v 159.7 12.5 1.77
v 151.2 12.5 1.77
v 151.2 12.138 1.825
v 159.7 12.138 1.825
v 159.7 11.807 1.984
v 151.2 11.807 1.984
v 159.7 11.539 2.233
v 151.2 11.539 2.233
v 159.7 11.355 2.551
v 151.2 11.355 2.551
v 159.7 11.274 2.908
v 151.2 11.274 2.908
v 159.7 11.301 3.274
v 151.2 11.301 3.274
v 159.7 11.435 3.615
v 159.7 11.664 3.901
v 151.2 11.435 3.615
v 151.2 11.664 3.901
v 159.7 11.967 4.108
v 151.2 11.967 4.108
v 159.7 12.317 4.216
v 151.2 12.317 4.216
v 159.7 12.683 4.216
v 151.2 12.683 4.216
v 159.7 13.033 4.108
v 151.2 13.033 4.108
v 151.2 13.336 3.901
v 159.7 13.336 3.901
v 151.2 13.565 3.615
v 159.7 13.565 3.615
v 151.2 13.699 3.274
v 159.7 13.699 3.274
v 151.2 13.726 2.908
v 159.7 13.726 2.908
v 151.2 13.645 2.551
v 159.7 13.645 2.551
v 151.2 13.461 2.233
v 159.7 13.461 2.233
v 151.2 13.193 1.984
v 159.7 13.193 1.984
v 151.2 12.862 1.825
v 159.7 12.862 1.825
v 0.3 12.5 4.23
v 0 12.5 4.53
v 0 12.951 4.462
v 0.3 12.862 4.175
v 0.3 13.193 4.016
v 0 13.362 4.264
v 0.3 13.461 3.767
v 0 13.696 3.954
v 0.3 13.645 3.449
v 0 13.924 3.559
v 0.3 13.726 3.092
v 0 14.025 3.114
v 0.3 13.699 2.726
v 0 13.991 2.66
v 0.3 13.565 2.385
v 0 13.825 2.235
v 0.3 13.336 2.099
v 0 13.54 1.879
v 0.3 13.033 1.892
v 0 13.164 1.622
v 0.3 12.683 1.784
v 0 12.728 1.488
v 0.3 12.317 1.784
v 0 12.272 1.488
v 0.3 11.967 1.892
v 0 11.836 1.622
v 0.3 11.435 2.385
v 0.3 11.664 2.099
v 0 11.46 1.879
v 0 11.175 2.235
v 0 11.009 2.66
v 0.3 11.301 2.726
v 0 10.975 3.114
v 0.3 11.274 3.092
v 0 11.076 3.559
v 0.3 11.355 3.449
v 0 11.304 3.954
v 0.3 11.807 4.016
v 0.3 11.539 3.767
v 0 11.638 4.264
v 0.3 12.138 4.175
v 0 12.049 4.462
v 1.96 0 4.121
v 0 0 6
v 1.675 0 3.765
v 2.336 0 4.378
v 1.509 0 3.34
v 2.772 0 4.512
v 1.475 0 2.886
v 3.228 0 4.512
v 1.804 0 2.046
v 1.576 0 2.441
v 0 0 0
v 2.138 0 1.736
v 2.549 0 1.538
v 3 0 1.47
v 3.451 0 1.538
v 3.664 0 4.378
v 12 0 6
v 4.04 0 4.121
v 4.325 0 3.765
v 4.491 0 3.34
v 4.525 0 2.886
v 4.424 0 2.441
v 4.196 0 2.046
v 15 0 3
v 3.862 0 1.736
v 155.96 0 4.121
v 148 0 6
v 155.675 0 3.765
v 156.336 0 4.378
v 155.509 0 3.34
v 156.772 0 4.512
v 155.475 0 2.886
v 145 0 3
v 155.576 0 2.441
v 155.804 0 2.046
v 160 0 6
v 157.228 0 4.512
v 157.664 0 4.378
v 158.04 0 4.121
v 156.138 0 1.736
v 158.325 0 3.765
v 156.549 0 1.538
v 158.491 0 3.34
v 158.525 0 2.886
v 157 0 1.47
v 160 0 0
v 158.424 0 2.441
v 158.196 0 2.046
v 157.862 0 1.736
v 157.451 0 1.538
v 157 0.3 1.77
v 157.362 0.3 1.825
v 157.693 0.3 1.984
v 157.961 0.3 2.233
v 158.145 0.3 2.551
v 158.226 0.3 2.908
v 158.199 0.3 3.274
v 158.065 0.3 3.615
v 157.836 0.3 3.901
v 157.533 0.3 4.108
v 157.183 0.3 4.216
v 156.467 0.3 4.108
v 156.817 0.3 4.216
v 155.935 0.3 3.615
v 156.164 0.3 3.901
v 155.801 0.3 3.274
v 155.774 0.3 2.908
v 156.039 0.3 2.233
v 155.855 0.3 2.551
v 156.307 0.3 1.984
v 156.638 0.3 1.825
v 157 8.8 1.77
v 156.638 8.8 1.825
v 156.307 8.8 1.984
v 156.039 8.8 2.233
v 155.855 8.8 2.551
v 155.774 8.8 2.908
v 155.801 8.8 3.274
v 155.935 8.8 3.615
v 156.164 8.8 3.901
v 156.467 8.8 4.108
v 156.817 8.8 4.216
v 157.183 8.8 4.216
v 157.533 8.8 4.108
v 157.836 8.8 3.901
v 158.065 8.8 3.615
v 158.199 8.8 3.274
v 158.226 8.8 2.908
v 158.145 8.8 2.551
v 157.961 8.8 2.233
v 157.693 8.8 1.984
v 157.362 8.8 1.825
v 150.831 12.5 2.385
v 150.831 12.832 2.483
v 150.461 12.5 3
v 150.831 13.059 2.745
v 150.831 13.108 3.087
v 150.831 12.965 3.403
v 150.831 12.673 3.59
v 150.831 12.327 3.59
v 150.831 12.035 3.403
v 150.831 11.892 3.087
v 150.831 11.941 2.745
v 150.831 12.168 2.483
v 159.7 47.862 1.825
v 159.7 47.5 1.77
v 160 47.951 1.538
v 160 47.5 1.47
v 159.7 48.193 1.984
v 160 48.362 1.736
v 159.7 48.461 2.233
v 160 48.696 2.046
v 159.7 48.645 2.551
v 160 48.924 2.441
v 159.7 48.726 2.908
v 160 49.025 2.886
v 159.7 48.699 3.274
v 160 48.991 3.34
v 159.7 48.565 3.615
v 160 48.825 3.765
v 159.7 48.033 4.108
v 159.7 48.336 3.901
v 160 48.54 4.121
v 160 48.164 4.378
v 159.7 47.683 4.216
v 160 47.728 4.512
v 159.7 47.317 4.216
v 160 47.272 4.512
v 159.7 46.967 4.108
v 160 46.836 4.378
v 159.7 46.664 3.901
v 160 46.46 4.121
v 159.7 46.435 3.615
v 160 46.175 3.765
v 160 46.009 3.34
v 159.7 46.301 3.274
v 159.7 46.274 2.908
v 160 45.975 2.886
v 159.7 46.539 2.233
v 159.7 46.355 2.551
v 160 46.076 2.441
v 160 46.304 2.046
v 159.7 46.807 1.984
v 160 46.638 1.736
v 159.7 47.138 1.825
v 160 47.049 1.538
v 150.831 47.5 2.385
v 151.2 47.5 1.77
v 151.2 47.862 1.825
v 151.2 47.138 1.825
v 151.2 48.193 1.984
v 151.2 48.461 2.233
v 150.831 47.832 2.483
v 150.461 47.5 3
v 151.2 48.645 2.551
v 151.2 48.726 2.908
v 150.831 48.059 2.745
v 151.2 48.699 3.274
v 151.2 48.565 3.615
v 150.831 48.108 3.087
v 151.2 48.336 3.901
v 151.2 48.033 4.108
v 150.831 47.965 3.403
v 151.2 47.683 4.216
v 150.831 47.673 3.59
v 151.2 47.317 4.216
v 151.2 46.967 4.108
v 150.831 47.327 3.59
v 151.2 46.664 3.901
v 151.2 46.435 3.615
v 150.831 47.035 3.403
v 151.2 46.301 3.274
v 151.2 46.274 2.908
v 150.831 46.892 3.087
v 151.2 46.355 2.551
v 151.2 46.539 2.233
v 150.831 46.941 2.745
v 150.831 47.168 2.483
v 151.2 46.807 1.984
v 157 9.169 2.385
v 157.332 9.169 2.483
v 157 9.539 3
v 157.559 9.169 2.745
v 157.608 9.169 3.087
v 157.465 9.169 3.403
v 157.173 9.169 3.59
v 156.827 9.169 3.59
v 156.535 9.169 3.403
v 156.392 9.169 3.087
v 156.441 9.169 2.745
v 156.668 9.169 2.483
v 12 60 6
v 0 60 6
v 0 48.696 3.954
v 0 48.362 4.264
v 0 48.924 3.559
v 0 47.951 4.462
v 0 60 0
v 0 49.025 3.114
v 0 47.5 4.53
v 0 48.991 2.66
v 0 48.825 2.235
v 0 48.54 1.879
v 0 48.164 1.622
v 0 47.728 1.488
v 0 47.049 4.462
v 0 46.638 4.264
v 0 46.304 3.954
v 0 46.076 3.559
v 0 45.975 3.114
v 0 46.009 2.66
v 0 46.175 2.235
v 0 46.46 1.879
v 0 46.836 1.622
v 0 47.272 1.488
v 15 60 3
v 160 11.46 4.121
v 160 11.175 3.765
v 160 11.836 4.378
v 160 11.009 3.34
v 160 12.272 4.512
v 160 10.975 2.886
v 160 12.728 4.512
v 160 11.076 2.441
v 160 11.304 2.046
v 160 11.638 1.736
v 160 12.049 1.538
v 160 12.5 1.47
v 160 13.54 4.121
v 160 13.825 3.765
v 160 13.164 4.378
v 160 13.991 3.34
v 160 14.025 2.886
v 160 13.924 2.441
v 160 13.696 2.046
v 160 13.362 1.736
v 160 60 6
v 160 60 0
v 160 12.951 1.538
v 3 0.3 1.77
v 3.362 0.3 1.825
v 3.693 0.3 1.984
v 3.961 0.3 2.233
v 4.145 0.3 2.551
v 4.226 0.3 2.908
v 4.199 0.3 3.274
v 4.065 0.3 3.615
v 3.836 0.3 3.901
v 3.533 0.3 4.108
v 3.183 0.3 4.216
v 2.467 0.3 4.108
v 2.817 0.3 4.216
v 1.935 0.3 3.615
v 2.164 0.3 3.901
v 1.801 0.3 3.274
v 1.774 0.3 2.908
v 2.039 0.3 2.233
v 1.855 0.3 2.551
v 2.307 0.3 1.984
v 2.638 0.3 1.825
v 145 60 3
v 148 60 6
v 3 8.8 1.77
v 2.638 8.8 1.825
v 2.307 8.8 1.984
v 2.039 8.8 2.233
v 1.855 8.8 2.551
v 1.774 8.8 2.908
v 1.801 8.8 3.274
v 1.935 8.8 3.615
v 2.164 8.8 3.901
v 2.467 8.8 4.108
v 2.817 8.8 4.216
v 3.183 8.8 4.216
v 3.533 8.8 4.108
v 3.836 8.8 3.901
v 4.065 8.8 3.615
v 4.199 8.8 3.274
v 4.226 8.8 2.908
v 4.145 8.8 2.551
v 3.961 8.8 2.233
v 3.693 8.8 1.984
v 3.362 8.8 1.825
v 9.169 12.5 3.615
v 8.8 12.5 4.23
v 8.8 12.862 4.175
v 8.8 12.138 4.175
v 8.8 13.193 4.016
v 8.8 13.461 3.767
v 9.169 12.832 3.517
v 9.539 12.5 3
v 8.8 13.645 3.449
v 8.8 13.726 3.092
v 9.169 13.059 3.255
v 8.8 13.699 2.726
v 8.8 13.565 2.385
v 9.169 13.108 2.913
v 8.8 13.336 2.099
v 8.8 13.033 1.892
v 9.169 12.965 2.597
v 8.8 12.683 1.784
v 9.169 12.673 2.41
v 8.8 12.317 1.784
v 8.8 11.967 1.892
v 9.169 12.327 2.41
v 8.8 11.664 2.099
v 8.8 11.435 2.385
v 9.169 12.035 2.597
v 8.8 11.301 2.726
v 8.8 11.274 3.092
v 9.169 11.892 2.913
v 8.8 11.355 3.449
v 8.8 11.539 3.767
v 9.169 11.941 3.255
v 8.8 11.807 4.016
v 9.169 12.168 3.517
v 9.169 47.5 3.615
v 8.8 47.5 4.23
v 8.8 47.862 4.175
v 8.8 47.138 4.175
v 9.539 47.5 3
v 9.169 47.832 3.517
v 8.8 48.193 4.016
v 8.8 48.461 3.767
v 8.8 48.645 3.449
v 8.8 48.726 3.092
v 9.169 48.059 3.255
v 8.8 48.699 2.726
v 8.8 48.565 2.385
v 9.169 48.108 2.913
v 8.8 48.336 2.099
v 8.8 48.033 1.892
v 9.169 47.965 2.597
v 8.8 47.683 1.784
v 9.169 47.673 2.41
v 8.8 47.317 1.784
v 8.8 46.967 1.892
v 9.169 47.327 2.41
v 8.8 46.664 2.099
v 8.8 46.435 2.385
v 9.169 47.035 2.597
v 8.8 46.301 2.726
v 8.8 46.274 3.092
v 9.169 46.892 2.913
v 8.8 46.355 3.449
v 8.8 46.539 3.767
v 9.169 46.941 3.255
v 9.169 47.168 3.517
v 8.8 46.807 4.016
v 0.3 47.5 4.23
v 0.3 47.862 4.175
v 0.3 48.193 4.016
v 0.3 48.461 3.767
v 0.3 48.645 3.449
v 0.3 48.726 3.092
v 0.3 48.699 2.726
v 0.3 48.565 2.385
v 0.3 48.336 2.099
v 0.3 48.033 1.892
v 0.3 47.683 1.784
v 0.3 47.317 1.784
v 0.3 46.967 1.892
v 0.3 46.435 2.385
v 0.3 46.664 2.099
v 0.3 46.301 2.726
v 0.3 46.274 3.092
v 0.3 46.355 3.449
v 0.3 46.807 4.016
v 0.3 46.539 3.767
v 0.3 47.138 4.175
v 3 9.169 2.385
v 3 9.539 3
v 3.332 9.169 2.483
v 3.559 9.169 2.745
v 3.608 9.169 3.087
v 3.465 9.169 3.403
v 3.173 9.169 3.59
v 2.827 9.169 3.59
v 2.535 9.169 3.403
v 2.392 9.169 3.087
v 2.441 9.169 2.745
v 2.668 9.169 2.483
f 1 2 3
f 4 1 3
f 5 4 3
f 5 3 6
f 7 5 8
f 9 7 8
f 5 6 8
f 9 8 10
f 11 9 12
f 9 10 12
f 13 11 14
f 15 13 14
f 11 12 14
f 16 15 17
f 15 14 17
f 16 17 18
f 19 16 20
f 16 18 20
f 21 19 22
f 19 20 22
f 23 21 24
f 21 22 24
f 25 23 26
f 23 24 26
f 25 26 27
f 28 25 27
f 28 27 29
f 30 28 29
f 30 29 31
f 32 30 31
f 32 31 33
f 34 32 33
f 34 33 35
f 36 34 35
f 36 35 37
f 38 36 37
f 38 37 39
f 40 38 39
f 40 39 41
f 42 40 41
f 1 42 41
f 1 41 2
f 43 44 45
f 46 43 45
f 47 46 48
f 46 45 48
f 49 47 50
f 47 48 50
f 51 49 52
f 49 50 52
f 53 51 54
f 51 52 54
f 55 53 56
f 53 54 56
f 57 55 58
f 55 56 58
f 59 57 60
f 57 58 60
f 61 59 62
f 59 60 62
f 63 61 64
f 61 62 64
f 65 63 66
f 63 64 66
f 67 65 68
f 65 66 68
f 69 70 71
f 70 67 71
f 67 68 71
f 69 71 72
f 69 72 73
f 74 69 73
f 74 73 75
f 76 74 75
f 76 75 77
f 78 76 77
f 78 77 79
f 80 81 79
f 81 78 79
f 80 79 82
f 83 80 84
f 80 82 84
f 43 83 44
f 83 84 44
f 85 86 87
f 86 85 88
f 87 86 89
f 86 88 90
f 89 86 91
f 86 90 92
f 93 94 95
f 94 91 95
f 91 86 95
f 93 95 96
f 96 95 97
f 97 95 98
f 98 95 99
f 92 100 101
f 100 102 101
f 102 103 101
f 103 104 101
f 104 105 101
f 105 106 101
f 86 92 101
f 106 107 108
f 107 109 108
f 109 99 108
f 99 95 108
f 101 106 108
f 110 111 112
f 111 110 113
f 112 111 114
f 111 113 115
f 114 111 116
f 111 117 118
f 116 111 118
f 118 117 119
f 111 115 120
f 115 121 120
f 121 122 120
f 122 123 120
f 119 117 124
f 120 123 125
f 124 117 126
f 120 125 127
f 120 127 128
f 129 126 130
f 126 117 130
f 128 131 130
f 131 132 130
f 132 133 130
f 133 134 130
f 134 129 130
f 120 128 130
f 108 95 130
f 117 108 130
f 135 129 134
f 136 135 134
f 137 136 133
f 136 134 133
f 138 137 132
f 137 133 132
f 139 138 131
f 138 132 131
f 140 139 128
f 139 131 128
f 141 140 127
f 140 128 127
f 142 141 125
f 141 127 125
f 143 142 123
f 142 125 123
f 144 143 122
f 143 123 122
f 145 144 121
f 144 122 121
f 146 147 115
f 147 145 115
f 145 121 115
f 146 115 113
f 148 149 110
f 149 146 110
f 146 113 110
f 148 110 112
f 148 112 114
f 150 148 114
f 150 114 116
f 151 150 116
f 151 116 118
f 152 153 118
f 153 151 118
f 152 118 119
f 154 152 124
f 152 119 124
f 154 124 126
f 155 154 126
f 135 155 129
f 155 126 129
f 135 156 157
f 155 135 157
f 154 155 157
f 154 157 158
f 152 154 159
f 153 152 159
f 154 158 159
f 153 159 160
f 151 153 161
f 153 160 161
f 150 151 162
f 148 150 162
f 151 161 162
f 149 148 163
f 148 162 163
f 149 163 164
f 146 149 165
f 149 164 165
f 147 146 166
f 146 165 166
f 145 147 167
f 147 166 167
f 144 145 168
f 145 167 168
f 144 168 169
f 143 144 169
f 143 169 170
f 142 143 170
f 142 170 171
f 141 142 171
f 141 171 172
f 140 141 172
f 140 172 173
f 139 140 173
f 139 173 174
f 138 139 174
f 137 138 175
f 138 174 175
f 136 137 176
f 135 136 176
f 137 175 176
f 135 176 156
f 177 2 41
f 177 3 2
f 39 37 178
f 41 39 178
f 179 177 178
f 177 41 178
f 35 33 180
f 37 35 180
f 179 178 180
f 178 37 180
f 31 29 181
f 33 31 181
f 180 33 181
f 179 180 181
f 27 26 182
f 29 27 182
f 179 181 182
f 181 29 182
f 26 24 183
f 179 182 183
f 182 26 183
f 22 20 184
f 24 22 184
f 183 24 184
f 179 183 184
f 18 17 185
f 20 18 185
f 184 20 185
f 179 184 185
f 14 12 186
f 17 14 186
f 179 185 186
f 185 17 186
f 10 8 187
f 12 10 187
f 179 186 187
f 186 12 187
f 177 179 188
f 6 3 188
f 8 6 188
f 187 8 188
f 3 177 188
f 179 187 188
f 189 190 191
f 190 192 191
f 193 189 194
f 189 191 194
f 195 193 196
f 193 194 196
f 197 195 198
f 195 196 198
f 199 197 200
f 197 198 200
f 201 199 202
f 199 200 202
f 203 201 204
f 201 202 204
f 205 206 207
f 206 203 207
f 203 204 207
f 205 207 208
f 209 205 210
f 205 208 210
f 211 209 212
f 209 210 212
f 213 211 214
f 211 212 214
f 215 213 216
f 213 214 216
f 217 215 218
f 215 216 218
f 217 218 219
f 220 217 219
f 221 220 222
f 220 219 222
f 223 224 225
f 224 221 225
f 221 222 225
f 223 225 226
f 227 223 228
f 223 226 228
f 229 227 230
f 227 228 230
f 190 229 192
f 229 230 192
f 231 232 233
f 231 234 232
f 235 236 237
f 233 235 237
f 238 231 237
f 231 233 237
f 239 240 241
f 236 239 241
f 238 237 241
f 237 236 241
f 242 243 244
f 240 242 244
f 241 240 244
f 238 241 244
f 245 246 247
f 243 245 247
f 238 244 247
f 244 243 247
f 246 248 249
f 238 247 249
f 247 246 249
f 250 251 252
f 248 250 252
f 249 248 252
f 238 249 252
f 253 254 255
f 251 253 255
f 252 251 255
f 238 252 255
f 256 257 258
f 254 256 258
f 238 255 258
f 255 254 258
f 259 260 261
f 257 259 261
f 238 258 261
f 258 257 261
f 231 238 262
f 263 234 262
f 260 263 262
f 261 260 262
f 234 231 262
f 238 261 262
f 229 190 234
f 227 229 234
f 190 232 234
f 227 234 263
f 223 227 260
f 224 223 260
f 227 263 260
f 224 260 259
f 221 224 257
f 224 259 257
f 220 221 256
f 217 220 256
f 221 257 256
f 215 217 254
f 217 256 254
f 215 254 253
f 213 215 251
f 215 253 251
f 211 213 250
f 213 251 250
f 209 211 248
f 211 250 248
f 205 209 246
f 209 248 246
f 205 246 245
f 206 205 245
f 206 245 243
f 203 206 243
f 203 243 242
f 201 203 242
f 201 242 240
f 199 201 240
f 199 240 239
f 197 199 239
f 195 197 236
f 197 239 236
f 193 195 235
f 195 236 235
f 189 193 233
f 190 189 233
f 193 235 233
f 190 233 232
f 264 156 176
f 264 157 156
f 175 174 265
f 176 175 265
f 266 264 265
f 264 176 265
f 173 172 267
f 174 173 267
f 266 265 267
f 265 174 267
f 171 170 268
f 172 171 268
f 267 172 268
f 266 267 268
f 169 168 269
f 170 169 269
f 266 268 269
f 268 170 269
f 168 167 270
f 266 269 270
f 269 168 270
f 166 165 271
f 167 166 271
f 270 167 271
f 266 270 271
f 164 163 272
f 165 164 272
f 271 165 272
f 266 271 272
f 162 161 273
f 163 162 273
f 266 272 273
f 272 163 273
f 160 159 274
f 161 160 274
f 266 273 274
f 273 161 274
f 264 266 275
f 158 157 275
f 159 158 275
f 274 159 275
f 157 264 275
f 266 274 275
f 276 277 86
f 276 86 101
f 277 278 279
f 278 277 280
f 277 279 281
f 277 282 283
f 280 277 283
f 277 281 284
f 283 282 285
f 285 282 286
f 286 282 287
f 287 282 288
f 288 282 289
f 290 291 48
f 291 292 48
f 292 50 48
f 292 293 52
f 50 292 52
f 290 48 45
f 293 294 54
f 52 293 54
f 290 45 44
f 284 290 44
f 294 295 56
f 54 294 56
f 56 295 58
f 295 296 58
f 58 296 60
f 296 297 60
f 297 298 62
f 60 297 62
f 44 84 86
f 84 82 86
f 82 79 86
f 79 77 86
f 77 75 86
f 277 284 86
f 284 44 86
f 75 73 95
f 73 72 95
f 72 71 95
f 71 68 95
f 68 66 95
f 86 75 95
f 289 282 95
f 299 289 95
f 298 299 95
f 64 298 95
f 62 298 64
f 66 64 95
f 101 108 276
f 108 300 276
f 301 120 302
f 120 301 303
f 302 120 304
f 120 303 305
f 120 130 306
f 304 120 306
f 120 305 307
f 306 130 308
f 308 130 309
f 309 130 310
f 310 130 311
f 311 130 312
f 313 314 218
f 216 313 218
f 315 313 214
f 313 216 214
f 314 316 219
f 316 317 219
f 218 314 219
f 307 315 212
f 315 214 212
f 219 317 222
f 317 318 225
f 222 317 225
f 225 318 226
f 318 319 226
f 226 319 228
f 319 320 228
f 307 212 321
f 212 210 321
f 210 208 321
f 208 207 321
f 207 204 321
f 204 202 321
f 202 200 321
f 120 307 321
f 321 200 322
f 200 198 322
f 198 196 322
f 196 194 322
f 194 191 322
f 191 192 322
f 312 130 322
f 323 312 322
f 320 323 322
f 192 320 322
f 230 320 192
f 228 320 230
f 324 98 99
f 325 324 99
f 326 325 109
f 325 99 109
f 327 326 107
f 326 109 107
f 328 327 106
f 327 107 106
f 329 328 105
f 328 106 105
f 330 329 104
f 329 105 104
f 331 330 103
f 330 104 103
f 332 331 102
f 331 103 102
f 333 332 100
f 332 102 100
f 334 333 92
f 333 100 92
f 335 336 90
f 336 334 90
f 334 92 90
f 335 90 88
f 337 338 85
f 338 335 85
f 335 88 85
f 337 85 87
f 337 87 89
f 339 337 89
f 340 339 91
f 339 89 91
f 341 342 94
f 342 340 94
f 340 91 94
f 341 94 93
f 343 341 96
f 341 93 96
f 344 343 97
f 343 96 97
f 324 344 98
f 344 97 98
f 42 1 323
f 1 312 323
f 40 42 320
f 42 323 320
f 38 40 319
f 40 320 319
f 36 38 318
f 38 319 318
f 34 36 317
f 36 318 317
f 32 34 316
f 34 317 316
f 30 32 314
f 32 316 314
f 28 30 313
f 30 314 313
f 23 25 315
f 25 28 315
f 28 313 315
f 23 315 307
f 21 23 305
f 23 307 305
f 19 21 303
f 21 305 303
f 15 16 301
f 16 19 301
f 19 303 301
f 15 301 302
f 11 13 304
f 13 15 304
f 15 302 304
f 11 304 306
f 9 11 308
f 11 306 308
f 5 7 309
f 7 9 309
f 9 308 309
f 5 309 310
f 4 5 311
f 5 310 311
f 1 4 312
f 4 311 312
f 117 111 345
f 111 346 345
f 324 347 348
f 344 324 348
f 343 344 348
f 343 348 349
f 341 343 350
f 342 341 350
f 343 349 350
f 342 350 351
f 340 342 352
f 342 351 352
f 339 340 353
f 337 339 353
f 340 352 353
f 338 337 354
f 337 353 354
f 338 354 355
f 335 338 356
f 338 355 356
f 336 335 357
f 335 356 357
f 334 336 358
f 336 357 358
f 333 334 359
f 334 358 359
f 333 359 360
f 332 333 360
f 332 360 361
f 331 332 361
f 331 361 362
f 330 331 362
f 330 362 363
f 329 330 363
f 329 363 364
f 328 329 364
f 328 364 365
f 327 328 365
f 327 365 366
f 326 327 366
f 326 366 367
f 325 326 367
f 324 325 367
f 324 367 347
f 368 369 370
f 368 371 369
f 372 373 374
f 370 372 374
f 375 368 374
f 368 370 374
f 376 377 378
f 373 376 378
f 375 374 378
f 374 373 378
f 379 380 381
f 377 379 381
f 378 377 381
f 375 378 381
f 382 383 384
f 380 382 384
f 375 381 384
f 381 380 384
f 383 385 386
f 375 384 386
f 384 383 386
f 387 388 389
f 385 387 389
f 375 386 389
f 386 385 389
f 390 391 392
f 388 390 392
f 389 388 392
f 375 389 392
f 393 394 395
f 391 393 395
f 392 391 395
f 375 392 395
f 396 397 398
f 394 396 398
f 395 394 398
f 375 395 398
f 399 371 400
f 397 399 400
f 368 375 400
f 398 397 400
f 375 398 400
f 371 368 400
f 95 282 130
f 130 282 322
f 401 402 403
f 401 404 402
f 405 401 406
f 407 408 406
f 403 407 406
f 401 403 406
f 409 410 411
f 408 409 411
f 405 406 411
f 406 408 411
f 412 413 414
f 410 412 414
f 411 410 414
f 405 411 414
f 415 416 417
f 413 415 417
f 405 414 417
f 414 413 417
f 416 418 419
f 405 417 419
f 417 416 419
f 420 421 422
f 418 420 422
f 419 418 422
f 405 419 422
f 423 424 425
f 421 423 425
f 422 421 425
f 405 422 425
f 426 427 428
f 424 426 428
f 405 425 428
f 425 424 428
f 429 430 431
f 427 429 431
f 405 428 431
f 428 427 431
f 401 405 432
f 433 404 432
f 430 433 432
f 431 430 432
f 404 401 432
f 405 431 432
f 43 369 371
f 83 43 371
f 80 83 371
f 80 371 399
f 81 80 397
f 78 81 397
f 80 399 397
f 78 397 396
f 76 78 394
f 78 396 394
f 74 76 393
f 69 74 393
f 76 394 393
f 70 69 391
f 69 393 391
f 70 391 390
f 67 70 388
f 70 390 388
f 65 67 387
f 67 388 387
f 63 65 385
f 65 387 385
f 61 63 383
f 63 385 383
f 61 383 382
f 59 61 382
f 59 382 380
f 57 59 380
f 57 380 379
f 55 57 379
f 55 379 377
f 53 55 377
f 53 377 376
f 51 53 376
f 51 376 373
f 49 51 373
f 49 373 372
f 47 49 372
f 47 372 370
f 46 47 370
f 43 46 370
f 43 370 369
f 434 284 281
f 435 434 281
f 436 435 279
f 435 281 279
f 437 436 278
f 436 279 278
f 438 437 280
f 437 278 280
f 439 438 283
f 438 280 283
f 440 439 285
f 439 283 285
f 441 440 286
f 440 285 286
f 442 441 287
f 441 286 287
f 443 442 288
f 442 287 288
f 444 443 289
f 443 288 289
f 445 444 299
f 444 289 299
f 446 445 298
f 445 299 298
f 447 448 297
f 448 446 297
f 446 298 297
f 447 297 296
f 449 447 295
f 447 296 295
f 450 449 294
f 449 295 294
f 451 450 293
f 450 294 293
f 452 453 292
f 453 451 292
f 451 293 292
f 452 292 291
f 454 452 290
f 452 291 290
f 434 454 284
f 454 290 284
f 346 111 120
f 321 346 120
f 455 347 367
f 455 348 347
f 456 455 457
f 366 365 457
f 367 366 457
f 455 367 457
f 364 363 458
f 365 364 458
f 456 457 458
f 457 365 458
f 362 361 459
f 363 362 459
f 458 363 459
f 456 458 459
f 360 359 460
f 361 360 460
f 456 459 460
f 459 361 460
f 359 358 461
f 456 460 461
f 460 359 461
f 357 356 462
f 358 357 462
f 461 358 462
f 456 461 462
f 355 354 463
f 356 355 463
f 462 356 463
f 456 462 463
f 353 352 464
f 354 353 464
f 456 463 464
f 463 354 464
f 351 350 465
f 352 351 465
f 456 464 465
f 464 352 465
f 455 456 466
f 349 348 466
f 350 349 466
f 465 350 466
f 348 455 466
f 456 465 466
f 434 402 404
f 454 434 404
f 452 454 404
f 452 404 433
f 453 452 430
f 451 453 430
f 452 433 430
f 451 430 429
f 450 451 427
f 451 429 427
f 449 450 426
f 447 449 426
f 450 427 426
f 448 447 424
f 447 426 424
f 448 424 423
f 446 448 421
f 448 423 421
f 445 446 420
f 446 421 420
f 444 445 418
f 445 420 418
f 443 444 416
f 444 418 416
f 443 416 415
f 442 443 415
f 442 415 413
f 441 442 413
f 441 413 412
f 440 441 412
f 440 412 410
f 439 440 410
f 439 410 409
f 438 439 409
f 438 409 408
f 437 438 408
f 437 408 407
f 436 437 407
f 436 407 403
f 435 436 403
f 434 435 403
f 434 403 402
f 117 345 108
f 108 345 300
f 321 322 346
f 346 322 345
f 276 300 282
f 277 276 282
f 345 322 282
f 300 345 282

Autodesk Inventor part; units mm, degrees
ref_plane "YZ Plane" through (0, 0, 0) normal (1, 0, 0) x (0, 1, 0)
ref_plane "XZ Plane" through (0, 0, 0) normal (0, 1, 0) x (-1, 0, 0)
ref_plane "XY Plane" through (0, 0, 0) normal (0, 0, 1) x (1, 0, 0)
sketch "Sketch1" plane through (0, 0, 0) normal (0, 0, 1) x (1, 0, 0)
  line L0 (0, 0) -> (160, 0)
  line L1 (160, 0) -> (160, 60)
  line L2 (160, 60) -> (0, 60)
  line L3 (0, 60) -> (0, 0)
  dimension "d0" = 160
  dimension "d1" = 60
extrude "Extrusion1" add sketch "Sketch1" along normal blind 6
sketch "Sketch2" plane through (0, 0, 0) normal (0, -1, 0) x (1, 0, 0)
  line L0 (3, 3) -> (157, 3) construction
  line L1 (160, 0) -> (0, 0) construction
  line L2 (0, 6) -> (160, 6) construction
  line L3 (160, 0) -> (160, 6) construction
  line L4 (0, 0) -> (0, 6) construction
  point P0 (0, 3)
  dimension "d4" = 3
  dimension "d5" = 6
  dimension "d6" = 3
  dimension "d7" = 3
hole "Hole1" at (3, 0, 3) at (157, 0, 3) direction (0, 1, 0) diameter 2.459 depth 8.8 tip angle 118 thread size "M3x0.5" class "6H" standard "ISO Metric profile"
chamfer "Chamfer1" distance 0.3 angle 45 2 edges at (3, 0, 4.2295) (157, 0, 4.2295)
sketch "Sketch3" plane through (0, 60, 0) normal (0, 1, 0) x (1, 0, 0)
  line L0 (160, -6) -> (0, -6) projected
  line L1 (148, -6) -> (145, -3)
  line L2 (148, -6) -> (152.2426, -6) construction
  line L3 (145, -3) -> (15, -3)
  line L4 (160, 0) -> (0, 0) projected
  line L5 (15, -3) -> (12, -6)
  line L6 (12, -6) -> (148, -6)
  line L7 (160, 0) -> (160, -6) projected
  line L8 (0, 0) -> (0, -6) projected
  point P0 (12, -6)
  point P1 (0, -3)
  dimension "d18" = 135
  dimension "d19" = 3
  dimension "d22" = 15
  dimension "d23" = 130
  dimension "d24" = 15
extrude "Extrusion2" cut sketch "Sketch3" against normal through all contours L0 L5 L3 L1
sketch "Sketch6" plane through (160, 0, 0) normal (1, 0, 0) x (0, 0, -1)
  line L0 (-3, 60) -> (-3, 0) projected
  circle A0 centre (-3, 12.5) radius 1.5
  circle A1 centre (-3, 47.5) radius 1.5
  line L1 (0, 0) -> (-6, 0) projected
  line L2 (0, 60) -> (-6, 60) projected
  dimension "d34" = 3
  dimension "d35" = 3
  dimension "d36" = 35
  dimension "d37" = 12.5
  dimension "d38" = 60
hole "Hole2" at (160, 12.5, 3) at (160, 47.5, 3) direction (-1, 0, 0) diameter 2.459 depth 8.8 tip angle 118 thread size "M3x0.5" class "6H" standard "ISO Metric profile"
sketch "Sketch7" plane through (0, 0, 0) normal (-1, 0, 0) x (0, 0, 1)
  line L0 (3, 60) -> (3, 0) projected
  circle A0 centre (3, 12.5) radius 1.5
  circle A1 centre (3, 47.5) radius 1.5
  line L1 (0, 60) -> (6, 60) projected
  line L2 (0, 0) -> (6, 0) projected
  dimension "d46" = 3
  dimension "d47" = 3
  dimension "d48" = 35
  dimension "d49" = 60
  dimension "d50" = 12.5
hole "Hole3" at (0, 47.5, 3) at (0, 12.5, 3) direction (1, 0, 0) diameter 2.459 depth 8.8 tip angle 118 thread size "M3x0.5" class "6H" standard "ISO Metric profile"
chamfer "Chamfer2" distance 0.3 angle 45 4 edges at (0, 47.5, 1.7705) (0, 12.5, 1.7705) (160, 47.5, 4.2295) (160, 12.5, 4.2295)
equation "\"d4\" = 0.5 * d5"
equation "\"d7\" = d6"
equation "\"d22\" = d24"
equation "\"d37\" = -0.5 * d36 + 0.5 * d38"
equation "\"d50\" = -0.5 * d48 + 0.5 * d49"
properties part number "Prawa ściana"
